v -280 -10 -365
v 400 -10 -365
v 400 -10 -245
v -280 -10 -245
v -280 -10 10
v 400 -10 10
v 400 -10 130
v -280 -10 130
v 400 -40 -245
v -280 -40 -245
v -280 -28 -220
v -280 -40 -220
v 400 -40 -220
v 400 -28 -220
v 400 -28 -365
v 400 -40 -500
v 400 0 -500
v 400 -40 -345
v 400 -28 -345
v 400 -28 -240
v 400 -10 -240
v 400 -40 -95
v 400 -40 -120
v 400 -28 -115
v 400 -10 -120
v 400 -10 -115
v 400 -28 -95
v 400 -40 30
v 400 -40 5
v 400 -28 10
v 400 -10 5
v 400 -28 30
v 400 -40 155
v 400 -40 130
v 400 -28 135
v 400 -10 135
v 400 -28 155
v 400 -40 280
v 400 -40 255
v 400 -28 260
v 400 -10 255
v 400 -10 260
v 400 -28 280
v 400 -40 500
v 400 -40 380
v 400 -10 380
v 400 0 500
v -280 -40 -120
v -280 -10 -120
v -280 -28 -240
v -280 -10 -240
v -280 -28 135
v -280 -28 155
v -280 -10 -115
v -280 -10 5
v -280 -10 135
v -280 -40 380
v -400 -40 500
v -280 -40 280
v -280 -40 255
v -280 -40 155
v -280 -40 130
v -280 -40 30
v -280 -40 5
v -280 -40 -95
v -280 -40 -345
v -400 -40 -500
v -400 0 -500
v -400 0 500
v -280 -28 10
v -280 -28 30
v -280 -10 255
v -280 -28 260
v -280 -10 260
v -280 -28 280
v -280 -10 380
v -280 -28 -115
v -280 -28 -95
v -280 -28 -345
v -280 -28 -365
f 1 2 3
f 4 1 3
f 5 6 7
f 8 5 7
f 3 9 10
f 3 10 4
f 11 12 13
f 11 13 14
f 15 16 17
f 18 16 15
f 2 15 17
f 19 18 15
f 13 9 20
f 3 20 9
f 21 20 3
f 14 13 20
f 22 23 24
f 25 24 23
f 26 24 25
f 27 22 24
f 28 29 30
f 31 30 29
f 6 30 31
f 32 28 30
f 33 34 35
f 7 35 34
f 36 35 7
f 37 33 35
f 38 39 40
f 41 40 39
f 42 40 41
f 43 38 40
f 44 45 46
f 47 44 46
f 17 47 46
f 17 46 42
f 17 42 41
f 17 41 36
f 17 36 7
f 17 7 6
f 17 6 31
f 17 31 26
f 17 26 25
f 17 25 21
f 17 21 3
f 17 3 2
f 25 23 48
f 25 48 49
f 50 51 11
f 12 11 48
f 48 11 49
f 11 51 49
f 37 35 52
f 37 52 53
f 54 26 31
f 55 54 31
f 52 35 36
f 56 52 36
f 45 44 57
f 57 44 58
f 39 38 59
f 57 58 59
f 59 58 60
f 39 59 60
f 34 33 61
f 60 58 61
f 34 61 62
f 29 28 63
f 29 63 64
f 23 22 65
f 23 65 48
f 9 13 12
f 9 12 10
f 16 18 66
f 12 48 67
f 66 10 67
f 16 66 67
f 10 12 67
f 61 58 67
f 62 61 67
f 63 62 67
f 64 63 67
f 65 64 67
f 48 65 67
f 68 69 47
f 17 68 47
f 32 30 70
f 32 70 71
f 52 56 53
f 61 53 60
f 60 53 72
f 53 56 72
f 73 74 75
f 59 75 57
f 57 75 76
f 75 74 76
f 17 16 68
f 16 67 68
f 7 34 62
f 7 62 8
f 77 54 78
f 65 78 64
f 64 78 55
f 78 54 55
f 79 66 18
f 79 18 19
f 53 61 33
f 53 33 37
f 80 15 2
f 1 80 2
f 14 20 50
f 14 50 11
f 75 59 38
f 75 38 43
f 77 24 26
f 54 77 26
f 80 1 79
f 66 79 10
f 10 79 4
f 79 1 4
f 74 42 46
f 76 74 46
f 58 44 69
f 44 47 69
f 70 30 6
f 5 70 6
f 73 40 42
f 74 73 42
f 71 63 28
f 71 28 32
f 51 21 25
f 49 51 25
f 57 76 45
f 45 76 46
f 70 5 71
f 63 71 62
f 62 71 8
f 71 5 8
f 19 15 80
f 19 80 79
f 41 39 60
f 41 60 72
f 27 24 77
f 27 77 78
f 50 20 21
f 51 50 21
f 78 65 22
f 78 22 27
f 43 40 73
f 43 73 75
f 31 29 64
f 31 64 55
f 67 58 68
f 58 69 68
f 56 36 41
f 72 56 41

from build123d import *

# Parameters (mm, degrees)
F0_W     = 800
F0_H     = 1000
F1_DEPTH = 10
F2_W     = 680
F2_H     = 120
F2_W_2   = 120
F2_H_2   = 880
F3_DEPTH = 30
F4_W     = 30
F4_H     = 25
F4_H_2   = 130
F5_DEPTH = 680
F6_W     = 18
F6_H     = 20
F7_DEPTH = 680


with BuildPart() as f1:
    # F0 (on Front) → F1 (new body)
    with BuildSketch(Plane.XZ):
        Rectangle(F0_W, F0_H)
    extrude(amount=F1_DEPTH)

    # F2 (on face) → F3 (join)
    with BuildSketch(Plane.XZ.offset(10)):
        with Locations((60, 440)):
            Rectangle(F2_W, F2_H)
        with Locations((-340, -60)):
            Rectangle(F2_W_2, F2_H_2)
        with Locations((-340, 440)):
            Rectangle(F2_W_2, F2_H)
    extrude(amount=F3_DEPTH)

    # F4 (on face) → F5 (join)
    with BuildSketch(Plane.YZ.offset(-280)):
        with Locations((-25, 267.5)):
            Rectangle(F4_W, F4_H)
        with Locations((-25, 142.5)):
            Rectangle(F4_W, F4_H)
        with Locations((-25, 17.5)):
            Rectangle(F4_W, F4_H)
        with Locations((-25, -107.5)):
            Rectangle(F4_W, F4_H)
        with Locations((-25, -232.5)):
            Rectangle(F4_W, F4_H)
        with Locations((-25, -357.5)):
            Rectangle(F4_W, F4_H)
        with Locations((-25, -435)):
            Rectangle(F4_W, F4_H_2)
    extrude(amount=F5_DEPTH)

    # F6 (on face) → F7 (cut)
    with BuildSketch(Plane.YZ.offset(400)):
        with Locations((-19, 270)):
            Rectangle(F6_W, F6_H)
        with Locations((-19, 145)):
            Rectangle(F6_W, F6_H)
        with Locations((-19, 20)):
            Rectangle(F6_W, F6_H)
        with Locations((-19, -105)):
            Rectangle(F6_W, F6_H)
        with Locations((-19, -230)):
            Rectangle(F6_W, F6_H)
        with Locations((-19, -355)):
            Rectangle(F6_W, F6_H)
    extrude(amount=-F7_DEPTH, mode=Mode.SUBTRACT)


solid = f1.part
